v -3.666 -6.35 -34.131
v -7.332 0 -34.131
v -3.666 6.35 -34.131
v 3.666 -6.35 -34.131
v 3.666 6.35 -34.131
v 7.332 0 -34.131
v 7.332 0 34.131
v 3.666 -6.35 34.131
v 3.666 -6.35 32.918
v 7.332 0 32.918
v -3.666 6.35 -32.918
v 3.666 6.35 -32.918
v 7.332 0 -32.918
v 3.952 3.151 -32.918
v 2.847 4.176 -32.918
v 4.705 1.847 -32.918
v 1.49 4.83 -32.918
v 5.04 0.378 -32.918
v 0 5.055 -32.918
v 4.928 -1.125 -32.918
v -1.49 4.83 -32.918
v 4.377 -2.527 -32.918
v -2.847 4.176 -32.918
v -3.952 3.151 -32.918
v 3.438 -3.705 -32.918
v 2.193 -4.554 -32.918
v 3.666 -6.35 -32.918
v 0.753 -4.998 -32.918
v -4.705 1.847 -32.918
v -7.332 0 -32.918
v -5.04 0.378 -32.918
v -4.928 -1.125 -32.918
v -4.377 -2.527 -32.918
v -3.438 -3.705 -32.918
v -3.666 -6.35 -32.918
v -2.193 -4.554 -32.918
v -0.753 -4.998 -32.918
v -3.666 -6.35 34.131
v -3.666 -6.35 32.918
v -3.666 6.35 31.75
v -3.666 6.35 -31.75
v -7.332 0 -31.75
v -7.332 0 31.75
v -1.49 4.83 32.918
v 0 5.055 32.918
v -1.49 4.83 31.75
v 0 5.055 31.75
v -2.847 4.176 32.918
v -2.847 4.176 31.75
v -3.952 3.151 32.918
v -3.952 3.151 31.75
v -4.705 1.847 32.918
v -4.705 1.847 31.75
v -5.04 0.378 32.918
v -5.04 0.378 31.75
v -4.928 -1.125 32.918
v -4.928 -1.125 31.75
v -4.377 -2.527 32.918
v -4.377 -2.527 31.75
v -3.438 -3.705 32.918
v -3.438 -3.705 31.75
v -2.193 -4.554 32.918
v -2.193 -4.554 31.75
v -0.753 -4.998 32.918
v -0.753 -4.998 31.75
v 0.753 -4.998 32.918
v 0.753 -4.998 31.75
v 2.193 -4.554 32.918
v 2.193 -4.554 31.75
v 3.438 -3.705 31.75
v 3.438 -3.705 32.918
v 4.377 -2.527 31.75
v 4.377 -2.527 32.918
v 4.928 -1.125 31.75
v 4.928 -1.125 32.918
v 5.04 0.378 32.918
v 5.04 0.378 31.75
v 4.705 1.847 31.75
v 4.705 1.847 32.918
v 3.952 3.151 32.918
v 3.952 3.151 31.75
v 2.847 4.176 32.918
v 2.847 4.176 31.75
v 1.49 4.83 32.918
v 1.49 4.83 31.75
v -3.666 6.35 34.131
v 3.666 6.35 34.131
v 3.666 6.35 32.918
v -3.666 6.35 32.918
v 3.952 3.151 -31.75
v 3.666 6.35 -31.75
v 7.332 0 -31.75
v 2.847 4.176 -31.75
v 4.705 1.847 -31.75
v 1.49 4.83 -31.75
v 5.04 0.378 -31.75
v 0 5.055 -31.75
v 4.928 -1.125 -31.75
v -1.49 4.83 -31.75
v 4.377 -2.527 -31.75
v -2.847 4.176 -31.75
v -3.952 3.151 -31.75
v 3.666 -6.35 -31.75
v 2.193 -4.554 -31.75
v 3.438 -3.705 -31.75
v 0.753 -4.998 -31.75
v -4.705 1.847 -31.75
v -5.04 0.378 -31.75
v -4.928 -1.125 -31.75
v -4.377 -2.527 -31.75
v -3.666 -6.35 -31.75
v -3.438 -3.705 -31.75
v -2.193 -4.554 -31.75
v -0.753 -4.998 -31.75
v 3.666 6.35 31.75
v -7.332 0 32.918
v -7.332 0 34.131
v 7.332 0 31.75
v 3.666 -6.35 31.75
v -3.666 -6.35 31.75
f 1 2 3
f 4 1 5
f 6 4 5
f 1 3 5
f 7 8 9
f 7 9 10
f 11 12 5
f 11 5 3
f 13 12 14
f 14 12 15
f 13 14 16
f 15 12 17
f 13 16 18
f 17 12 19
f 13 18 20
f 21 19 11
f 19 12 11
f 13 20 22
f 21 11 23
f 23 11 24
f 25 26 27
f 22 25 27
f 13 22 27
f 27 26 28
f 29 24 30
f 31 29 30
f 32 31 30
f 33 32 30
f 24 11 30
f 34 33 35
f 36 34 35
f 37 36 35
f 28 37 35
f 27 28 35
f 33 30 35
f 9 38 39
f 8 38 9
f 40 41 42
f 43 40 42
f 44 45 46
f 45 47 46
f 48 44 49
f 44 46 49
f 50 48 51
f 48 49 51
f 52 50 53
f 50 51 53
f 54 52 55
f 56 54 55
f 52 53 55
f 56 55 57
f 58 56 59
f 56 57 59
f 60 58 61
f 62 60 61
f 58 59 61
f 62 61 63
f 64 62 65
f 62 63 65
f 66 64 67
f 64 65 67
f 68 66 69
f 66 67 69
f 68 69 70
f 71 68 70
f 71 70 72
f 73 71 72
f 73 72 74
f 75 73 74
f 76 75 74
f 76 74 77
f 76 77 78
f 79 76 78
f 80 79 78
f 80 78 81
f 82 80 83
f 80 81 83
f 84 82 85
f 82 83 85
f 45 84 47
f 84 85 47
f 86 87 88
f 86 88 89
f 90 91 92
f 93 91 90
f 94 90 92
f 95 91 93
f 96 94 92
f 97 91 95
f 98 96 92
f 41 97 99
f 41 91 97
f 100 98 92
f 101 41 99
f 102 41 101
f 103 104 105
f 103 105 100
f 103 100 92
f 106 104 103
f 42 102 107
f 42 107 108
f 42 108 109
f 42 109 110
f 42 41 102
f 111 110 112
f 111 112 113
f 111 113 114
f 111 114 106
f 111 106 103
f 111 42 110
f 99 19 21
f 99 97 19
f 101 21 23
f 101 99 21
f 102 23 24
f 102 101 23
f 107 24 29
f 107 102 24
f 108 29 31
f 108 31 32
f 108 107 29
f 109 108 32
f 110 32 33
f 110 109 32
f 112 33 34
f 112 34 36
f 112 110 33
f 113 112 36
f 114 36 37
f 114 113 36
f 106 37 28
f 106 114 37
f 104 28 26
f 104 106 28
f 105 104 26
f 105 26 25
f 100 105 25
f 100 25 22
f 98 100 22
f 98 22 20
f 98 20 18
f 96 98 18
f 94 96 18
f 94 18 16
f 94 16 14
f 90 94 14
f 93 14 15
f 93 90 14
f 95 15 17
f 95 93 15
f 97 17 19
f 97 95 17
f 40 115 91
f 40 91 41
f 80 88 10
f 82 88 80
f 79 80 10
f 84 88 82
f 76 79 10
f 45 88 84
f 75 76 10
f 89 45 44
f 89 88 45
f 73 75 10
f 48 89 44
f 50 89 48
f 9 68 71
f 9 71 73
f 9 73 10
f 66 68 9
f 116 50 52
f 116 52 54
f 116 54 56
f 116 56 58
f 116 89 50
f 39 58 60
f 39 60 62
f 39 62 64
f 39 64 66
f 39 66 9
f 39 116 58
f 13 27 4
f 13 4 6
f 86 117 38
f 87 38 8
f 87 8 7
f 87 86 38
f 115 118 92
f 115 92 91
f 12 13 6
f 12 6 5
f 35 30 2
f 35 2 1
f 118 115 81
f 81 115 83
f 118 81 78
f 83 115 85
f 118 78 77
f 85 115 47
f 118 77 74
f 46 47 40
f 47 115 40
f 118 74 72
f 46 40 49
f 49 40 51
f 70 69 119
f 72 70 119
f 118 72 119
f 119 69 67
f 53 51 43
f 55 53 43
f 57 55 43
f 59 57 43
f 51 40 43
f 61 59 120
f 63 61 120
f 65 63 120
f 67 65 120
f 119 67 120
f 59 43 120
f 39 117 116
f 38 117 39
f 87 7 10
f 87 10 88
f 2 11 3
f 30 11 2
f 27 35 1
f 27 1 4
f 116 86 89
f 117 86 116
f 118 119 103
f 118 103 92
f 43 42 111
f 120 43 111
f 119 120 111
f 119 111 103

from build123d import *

# Parameters (mm, degrees)
BOSS_EXTRUDE1_DEPTH = 34.13125
SKETCH2_W           = 1.1684
SKETCH2_H           = 4.415483176


with BuildPart() as part:
    # Sketch1 → Boss-Extrude1 (new, symmetric)
    with BuildSketch(Plane.XY):
        Polygon((-3.666174209, 6.35), (-7.332348419, 0), (-3.666174209, -6.35), (3.666174209, -6.35), (7.332348419, 0), (3.666174209, 6.35), align=None)
    extrude(amount=BOSS_EXTRUDE1_DEPTH, both=True)

    # Sketch2 → Cut-Revolve1 (revolve, cut)
    with BuildSketch(Plane(origin=(0, 0, 0), x_dir=(0, 0, -1), z_dir=(1, 0, 0))):
        with Locations((-32.3342, 7.262341588)):
            Rectangle(SKETCH2_W, SKETCH2_H)
    cut_revolve1 = revolve(axis=Axis((0, 0, 0), (0, 0, 1)), mode=Mode.SUBTRACT)

    # Mirror1: Cut-Revolve1 across plane
    add(cut_revolve1.mirror(Plane.XY), mode=Mode.SUBTRACT)


solid = part.part
